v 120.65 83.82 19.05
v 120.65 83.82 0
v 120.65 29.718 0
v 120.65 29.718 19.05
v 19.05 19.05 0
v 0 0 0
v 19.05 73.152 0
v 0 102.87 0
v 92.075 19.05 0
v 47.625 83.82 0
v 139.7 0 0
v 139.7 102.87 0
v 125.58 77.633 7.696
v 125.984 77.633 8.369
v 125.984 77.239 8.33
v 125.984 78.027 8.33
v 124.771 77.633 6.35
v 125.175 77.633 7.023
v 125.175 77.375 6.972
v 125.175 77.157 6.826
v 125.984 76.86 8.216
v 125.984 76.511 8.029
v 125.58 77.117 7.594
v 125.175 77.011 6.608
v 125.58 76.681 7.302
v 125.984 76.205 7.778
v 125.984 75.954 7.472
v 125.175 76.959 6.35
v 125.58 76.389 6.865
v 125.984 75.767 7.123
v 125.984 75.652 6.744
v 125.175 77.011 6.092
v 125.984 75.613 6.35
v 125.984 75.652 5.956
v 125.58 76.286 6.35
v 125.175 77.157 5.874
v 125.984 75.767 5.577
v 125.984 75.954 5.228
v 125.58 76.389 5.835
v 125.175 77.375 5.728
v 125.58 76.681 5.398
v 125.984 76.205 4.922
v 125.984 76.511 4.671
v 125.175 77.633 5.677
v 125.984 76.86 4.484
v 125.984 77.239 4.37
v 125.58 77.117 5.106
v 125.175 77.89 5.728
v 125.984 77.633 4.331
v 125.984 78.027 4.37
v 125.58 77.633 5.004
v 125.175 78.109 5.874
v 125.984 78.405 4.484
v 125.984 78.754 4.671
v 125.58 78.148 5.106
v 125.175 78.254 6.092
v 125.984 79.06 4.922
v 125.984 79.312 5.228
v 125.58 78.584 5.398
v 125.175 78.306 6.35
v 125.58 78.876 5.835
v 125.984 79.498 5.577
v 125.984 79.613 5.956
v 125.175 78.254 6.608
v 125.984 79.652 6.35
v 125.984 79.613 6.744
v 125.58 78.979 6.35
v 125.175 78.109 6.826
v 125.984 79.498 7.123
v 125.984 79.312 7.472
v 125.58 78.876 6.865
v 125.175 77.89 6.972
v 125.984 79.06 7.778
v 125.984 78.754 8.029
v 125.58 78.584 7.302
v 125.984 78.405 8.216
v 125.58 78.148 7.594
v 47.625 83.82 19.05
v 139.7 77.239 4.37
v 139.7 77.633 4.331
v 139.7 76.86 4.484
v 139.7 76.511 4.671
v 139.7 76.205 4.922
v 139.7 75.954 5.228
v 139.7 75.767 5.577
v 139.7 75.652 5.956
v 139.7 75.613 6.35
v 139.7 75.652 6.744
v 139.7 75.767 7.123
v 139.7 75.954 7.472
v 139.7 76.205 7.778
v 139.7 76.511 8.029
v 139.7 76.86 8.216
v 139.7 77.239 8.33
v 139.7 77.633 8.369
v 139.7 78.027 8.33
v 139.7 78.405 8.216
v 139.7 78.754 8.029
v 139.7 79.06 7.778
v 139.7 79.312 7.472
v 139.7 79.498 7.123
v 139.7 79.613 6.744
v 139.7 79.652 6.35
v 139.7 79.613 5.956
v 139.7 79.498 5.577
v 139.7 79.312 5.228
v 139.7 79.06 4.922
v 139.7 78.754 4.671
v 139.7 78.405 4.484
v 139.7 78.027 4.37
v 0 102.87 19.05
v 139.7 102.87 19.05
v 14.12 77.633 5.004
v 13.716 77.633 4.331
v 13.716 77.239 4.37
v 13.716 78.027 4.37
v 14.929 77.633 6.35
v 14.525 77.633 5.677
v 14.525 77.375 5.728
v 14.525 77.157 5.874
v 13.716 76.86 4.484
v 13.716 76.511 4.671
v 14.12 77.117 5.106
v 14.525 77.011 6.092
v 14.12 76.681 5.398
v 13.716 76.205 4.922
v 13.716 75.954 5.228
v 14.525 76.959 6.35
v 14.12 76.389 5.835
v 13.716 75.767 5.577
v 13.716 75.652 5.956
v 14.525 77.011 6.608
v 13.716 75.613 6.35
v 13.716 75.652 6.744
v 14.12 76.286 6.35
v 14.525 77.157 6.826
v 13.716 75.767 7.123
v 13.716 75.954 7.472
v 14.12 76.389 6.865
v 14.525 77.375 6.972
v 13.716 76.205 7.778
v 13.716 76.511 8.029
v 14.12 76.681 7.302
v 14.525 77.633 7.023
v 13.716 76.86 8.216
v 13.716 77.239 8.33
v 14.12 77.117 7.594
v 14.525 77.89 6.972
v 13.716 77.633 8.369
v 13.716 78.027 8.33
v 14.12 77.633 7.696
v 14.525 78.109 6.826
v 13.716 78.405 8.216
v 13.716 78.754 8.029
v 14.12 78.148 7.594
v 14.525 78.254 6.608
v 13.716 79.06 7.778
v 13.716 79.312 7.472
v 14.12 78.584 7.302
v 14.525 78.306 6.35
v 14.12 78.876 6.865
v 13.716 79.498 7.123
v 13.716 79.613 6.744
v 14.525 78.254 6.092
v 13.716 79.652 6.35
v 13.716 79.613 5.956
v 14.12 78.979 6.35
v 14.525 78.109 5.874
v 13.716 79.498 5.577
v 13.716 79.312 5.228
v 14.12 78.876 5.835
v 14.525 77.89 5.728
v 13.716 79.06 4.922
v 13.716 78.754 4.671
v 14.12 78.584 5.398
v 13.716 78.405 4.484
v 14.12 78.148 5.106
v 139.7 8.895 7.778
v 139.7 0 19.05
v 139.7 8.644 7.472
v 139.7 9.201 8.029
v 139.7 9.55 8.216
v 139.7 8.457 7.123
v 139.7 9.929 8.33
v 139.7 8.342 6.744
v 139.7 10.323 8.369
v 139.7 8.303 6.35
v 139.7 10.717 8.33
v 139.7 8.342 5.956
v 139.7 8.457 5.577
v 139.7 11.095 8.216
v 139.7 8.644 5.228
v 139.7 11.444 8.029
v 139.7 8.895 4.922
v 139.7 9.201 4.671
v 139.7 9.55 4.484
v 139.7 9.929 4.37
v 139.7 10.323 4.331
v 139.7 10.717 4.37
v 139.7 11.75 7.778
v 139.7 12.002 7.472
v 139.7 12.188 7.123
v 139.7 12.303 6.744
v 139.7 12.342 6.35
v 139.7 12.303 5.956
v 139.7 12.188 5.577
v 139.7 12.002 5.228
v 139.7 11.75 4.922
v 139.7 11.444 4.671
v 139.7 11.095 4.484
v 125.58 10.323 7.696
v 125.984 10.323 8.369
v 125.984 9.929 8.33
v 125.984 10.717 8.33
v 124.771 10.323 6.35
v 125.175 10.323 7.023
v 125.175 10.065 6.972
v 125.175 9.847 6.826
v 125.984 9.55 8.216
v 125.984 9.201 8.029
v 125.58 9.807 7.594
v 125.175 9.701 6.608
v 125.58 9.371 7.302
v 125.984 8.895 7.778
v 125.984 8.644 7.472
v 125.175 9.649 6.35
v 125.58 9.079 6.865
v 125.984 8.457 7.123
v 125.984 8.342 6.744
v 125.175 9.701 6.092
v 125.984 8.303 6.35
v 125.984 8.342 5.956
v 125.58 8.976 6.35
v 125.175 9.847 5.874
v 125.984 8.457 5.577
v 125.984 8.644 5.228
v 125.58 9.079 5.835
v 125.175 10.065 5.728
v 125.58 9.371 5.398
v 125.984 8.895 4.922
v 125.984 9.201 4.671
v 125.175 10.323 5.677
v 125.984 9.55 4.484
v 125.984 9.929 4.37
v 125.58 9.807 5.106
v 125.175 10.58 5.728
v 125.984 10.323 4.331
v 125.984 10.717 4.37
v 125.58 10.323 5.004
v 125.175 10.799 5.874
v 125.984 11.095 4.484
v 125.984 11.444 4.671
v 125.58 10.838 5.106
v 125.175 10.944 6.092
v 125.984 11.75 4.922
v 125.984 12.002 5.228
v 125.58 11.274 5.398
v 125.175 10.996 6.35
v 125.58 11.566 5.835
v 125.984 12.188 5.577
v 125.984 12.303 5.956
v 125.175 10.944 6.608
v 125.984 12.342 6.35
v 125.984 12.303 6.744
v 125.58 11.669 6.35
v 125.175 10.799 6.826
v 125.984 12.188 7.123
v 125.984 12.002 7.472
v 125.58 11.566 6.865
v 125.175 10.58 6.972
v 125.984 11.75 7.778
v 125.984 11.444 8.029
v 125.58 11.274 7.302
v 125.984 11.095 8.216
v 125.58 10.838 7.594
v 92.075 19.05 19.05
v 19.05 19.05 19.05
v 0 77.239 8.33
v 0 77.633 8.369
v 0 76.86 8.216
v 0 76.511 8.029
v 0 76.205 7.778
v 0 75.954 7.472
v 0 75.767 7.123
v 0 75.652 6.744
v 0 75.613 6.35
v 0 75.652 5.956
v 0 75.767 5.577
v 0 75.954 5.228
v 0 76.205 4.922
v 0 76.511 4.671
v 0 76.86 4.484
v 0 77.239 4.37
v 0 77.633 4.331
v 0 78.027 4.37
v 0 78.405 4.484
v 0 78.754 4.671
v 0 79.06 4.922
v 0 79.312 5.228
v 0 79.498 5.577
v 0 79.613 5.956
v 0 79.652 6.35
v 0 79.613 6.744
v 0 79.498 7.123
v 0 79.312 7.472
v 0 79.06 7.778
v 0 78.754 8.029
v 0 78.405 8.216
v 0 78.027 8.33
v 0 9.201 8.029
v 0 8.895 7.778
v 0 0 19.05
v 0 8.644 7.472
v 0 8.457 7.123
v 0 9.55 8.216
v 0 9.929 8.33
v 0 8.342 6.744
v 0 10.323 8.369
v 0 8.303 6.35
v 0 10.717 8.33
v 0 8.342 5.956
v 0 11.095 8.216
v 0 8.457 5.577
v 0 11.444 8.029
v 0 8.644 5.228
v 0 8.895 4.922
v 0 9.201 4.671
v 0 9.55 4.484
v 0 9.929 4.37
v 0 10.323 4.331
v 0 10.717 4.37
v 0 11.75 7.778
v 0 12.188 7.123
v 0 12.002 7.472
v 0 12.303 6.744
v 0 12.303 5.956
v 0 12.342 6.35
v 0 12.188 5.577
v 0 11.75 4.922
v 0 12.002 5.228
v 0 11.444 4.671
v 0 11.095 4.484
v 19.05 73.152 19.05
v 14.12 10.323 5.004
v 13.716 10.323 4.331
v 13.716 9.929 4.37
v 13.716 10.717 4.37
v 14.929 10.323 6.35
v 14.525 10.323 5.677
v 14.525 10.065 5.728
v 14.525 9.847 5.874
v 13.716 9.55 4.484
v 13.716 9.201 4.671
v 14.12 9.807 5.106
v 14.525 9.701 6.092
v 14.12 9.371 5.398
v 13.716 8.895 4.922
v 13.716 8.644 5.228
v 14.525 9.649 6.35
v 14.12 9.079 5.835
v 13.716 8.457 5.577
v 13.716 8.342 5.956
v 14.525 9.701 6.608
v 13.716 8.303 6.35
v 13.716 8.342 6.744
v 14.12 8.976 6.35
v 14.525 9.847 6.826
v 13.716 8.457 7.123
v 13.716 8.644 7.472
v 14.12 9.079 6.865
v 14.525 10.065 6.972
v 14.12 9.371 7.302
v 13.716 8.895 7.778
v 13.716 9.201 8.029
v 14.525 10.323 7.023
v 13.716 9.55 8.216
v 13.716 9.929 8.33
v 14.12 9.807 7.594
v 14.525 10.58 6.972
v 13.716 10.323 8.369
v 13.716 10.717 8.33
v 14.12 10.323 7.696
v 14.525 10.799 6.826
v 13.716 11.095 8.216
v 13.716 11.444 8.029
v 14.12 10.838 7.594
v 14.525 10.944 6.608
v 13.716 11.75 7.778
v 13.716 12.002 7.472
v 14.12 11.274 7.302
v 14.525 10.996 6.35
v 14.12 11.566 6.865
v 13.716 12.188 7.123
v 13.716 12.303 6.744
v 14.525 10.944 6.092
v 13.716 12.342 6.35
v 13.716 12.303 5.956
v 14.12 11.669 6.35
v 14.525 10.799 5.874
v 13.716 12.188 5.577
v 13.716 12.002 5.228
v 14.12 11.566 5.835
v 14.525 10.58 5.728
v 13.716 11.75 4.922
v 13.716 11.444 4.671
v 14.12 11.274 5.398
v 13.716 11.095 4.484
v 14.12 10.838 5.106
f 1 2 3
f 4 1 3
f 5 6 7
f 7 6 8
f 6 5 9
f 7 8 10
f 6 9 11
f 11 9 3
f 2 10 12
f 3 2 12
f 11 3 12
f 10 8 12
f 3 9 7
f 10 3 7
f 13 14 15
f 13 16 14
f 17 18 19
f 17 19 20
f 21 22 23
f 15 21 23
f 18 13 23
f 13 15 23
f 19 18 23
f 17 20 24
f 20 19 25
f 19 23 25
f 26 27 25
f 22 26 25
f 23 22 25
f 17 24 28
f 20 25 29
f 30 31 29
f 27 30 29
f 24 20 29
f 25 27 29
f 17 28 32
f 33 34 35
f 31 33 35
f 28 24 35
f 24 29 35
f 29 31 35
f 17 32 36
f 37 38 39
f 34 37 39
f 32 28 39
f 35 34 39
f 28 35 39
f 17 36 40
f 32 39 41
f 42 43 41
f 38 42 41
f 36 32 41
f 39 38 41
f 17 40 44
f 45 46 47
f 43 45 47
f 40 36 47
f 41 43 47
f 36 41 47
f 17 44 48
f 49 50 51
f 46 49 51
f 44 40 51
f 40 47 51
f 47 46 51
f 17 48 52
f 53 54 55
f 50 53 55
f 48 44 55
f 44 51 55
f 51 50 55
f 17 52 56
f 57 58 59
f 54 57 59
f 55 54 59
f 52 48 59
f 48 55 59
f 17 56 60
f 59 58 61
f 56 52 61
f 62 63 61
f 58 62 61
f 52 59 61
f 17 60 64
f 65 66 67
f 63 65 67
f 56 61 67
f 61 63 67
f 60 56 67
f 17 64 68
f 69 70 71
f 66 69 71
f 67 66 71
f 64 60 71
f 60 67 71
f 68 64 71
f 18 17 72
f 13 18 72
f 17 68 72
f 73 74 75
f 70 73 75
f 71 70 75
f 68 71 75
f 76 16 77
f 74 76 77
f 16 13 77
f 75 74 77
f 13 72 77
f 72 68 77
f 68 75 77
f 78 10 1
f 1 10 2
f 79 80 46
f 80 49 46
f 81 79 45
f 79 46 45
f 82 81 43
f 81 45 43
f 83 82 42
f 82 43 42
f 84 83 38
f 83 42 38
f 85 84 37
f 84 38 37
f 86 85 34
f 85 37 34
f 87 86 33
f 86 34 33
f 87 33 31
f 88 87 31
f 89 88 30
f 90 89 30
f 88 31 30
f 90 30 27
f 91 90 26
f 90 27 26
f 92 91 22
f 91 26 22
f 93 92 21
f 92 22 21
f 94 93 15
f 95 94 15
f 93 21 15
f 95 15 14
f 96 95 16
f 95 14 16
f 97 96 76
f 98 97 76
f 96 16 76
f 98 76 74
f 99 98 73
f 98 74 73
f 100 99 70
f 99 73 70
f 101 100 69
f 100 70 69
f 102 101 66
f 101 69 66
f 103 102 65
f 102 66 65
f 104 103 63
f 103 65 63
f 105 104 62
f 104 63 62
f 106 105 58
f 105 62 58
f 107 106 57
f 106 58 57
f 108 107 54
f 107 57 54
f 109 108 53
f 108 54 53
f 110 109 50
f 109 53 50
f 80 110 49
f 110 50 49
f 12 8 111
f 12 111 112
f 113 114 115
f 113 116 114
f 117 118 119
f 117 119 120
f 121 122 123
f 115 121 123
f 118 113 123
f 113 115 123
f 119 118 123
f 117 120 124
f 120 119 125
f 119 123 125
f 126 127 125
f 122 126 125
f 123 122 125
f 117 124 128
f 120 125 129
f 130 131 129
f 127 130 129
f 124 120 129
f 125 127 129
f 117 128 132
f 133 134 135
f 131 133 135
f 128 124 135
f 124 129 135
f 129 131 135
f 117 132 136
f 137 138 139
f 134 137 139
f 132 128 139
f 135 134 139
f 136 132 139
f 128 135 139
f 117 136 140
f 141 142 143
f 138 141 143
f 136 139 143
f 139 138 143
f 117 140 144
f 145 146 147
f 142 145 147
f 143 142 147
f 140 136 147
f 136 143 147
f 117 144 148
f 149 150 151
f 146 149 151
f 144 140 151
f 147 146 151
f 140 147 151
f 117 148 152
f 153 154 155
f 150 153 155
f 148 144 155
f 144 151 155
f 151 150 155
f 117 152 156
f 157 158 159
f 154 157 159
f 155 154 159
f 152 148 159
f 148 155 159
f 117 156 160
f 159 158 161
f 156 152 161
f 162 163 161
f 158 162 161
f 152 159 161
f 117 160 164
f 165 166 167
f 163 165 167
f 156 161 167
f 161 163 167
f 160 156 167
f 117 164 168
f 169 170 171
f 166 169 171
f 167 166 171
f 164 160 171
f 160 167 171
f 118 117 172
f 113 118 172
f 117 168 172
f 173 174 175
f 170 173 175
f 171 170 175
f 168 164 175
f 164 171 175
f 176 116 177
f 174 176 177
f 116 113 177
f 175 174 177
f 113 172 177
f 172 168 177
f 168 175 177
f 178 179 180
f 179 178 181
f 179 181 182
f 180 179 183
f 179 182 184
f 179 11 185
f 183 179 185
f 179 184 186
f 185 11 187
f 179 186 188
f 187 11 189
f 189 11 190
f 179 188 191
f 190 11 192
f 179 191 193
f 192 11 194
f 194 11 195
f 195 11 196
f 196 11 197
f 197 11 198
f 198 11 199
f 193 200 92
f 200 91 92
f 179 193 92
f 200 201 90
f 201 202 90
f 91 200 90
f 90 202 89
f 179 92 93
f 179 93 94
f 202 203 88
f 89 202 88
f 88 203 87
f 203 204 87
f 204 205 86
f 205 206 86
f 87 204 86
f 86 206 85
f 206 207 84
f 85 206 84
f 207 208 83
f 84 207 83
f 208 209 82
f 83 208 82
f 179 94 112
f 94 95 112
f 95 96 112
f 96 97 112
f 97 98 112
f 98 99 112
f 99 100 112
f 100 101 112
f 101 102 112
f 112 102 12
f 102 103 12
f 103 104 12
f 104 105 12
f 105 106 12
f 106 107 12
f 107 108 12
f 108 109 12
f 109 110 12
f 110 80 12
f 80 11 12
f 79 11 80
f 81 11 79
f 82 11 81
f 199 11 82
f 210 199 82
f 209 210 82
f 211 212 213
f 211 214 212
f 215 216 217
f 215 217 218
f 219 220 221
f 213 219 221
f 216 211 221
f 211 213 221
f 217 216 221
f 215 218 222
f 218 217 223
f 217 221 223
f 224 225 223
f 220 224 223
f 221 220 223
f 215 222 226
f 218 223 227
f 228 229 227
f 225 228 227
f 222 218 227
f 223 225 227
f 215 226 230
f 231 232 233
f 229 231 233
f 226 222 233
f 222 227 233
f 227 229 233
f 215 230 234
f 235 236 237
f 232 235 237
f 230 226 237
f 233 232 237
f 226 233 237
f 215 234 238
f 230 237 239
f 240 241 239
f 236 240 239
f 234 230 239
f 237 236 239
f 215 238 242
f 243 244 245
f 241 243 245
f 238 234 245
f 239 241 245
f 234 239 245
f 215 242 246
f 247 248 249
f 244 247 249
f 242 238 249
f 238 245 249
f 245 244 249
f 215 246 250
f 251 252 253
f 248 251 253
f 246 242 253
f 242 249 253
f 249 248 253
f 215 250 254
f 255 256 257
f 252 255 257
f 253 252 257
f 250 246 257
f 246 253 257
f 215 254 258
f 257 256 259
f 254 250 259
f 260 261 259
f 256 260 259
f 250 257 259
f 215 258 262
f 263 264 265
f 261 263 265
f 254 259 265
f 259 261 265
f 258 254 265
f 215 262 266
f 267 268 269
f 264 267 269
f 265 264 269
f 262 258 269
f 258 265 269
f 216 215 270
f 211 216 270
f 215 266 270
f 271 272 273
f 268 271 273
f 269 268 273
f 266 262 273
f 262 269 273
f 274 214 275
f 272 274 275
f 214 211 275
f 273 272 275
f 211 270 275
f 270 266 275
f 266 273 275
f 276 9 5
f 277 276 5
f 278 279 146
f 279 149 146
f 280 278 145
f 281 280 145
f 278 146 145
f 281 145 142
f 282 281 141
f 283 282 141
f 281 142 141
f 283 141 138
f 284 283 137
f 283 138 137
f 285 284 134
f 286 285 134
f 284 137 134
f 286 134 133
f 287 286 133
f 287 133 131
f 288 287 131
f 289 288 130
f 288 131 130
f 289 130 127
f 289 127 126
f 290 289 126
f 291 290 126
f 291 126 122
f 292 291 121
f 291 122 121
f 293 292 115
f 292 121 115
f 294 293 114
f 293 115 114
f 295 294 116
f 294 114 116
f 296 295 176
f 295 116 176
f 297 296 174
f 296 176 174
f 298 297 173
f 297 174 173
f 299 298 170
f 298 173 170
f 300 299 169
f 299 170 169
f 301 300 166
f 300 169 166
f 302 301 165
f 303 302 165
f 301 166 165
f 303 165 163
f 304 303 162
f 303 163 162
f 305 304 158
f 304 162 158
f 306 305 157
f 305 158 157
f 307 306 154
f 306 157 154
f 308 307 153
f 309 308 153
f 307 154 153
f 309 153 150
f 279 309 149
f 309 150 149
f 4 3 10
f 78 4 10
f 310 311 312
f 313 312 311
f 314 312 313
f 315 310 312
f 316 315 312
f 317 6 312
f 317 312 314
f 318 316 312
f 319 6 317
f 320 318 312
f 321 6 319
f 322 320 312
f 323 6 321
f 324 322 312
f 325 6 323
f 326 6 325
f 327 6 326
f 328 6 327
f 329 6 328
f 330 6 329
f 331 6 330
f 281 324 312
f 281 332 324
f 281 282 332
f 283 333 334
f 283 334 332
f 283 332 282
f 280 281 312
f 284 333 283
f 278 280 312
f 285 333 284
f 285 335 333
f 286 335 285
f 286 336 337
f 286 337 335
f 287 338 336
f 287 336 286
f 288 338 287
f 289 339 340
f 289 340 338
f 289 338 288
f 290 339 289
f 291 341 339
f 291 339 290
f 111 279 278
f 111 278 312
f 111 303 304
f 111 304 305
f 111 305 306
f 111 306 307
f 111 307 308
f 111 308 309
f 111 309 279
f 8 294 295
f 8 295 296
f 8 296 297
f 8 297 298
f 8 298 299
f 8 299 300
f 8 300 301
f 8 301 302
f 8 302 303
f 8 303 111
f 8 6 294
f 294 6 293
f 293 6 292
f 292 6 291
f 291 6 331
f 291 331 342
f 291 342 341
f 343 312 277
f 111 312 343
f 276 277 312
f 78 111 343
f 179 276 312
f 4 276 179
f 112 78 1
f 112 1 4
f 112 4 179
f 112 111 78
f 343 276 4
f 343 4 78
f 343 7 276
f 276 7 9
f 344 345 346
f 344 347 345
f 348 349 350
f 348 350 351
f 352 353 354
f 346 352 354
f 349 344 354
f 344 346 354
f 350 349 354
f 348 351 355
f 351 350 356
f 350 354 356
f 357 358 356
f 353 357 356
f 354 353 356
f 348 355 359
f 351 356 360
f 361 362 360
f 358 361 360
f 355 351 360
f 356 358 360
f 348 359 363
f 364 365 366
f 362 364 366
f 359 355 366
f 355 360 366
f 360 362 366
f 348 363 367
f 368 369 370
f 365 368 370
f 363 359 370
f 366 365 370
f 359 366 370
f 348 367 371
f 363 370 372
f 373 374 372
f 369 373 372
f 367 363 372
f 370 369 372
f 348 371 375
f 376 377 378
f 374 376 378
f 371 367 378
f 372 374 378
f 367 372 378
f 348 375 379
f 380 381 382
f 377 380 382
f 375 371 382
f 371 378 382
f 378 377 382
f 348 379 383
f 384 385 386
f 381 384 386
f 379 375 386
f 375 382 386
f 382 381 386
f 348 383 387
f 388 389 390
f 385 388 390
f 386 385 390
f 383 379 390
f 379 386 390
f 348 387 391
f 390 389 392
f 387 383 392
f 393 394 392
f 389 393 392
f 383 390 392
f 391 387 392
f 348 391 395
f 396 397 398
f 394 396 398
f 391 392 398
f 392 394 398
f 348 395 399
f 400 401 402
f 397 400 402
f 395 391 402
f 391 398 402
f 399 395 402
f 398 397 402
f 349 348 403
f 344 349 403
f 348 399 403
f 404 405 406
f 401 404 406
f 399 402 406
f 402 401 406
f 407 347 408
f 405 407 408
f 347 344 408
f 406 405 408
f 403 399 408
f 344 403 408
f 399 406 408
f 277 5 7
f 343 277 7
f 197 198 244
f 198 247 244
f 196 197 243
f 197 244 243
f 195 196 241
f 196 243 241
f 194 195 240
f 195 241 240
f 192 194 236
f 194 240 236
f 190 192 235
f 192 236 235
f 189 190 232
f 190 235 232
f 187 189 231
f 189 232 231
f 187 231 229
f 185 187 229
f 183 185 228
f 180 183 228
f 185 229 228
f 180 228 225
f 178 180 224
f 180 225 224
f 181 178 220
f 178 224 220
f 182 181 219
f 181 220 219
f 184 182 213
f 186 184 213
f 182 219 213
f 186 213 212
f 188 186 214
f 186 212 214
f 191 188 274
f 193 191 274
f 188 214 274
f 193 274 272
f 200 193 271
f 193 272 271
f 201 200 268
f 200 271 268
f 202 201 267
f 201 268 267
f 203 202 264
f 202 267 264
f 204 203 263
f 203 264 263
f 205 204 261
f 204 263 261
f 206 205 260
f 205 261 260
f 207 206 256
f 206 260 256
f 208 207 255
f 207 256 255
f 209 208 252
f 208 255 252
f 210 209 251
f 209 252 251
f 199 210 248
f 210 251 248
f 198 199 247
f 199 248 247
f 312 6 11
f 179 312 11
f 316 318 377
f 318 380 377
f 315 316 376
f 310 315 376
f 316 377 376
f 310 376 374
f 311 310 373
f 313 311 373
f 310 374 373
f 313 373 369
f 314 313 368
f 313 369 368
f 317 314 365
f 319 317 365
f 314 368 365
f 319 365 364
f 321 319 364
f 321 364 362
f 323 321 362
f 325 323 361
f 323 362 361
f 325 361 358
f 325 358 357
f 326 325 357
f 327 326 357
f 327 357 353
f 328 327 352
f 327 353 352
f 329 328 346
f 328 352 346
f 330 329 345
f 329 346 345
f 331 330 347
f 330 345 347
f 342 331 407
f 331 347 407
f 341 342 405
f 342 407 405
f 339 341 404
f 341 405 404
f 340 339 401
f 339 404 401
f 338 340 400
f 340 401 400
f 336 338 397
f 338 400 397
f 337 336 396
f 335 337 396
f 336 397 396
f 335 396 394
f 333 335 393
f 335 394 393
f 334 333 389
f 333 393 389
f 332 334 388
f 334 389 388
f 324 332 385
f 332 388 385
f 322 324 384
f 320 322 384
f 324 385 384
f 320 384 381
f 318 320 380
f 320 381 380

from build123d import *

# Parameters (mm, degrees)
SKETCH1_W                            = 139.7
SKETCH1_H                            = 102.87
BOSS_EXTRUDE1_DEPTH                  = 19.05
F_10_32_TAPPED_HOLE2_D               = 4.0386
F_10_32_TAPPED_HOLE2_DEPTH           = 13.716
F_10_32_TAPPED_HOLE2_TIP             = 1.213317848
F_10_32_TAPPED_HOLE2_ON_FACE_2_D     = 4.0386
F_10_32_TAPPED_HOLE2_ON_FACE_2_DEPTH = 13.716
F_10_32_TAPPED_HOLE2_ON_FACE_2_TIP   = 1.213317848


with BuildPart() as part:
    # Sketch1 → Boss-Extrude1 (new body)
    with BuildSketch(Plane.XY):
        with Locations((69.85, 51.435)):
            Rectangle(SKETCH1_W, SKETCH1_H)
        Polygon((19.05, 19.05), (19.05, 73.152), (92.075, 19.05), align=None, mode=Mode.SUBTRACT)
        Polygon((120.65, 83.82), (120.65, 29.718), (47.625, 83.82), align=None, mode=Mode.SUBTRACT)
    extrude(amount=BOSS_EXTRUDE1_DEPTH)

    # #10-32 Tapped Hole2
    with Locations(Plane(origin=(0, 77.63256, 6.35), x_dir=(0, 0, -1), z_dir=(-1, 0, 0))):
        with Locations((0, 0), (0, 67.31)):
            Hole(F_10_32_TAPPED_HOLE2_D / 2, depth=F_10_32_TAPPED_HOLE2_DEPTH)
            with Locations((0, 0, -(F_10_32_TAPPED_HOLE2_DEPTH + F_10_32_TAPPED_HOLE2_TIP / 2))):  # 118° drill point
                Cone(0, F_10_32_TAPPED_HOLE2_D / 2, F_10_32_TAPPED_HOLE2_TIP, mode=Mode.SUBTRACT)

    # #10-32 Tapped Hole2 on face 2
    with Locations(Plane(origin=(139.7, 10.32256, 6.35), x_dir=(0, 0, 1), z_dir=(1, 0, 0))):
        with Locations((0, 0), (0, -67.31)):
            Hole(F_10_32_TAPPED_HOLE2_ON_FACE_2_D / 2, depth=F_10_32_TAPPED_HOLE2_ON_FACE_2_DEPTH)
            with Locations((0, 0, -(F_10_32_TAPPED_HOLE2_ON_FACE_2_DEPTH + F_10_32_TAPPED_HOLE2_ON_FACE_2_TIP / 2))):  # 118° drill point
                Cone(0, F_10_32_TAPPED_HOLE2_ON_FACE_2_D / 2, F_10_32_TAPPED_HOLE2_ON_FACE_2_TIP, mode=Mode.SUBTRACT)


solid = part.part
